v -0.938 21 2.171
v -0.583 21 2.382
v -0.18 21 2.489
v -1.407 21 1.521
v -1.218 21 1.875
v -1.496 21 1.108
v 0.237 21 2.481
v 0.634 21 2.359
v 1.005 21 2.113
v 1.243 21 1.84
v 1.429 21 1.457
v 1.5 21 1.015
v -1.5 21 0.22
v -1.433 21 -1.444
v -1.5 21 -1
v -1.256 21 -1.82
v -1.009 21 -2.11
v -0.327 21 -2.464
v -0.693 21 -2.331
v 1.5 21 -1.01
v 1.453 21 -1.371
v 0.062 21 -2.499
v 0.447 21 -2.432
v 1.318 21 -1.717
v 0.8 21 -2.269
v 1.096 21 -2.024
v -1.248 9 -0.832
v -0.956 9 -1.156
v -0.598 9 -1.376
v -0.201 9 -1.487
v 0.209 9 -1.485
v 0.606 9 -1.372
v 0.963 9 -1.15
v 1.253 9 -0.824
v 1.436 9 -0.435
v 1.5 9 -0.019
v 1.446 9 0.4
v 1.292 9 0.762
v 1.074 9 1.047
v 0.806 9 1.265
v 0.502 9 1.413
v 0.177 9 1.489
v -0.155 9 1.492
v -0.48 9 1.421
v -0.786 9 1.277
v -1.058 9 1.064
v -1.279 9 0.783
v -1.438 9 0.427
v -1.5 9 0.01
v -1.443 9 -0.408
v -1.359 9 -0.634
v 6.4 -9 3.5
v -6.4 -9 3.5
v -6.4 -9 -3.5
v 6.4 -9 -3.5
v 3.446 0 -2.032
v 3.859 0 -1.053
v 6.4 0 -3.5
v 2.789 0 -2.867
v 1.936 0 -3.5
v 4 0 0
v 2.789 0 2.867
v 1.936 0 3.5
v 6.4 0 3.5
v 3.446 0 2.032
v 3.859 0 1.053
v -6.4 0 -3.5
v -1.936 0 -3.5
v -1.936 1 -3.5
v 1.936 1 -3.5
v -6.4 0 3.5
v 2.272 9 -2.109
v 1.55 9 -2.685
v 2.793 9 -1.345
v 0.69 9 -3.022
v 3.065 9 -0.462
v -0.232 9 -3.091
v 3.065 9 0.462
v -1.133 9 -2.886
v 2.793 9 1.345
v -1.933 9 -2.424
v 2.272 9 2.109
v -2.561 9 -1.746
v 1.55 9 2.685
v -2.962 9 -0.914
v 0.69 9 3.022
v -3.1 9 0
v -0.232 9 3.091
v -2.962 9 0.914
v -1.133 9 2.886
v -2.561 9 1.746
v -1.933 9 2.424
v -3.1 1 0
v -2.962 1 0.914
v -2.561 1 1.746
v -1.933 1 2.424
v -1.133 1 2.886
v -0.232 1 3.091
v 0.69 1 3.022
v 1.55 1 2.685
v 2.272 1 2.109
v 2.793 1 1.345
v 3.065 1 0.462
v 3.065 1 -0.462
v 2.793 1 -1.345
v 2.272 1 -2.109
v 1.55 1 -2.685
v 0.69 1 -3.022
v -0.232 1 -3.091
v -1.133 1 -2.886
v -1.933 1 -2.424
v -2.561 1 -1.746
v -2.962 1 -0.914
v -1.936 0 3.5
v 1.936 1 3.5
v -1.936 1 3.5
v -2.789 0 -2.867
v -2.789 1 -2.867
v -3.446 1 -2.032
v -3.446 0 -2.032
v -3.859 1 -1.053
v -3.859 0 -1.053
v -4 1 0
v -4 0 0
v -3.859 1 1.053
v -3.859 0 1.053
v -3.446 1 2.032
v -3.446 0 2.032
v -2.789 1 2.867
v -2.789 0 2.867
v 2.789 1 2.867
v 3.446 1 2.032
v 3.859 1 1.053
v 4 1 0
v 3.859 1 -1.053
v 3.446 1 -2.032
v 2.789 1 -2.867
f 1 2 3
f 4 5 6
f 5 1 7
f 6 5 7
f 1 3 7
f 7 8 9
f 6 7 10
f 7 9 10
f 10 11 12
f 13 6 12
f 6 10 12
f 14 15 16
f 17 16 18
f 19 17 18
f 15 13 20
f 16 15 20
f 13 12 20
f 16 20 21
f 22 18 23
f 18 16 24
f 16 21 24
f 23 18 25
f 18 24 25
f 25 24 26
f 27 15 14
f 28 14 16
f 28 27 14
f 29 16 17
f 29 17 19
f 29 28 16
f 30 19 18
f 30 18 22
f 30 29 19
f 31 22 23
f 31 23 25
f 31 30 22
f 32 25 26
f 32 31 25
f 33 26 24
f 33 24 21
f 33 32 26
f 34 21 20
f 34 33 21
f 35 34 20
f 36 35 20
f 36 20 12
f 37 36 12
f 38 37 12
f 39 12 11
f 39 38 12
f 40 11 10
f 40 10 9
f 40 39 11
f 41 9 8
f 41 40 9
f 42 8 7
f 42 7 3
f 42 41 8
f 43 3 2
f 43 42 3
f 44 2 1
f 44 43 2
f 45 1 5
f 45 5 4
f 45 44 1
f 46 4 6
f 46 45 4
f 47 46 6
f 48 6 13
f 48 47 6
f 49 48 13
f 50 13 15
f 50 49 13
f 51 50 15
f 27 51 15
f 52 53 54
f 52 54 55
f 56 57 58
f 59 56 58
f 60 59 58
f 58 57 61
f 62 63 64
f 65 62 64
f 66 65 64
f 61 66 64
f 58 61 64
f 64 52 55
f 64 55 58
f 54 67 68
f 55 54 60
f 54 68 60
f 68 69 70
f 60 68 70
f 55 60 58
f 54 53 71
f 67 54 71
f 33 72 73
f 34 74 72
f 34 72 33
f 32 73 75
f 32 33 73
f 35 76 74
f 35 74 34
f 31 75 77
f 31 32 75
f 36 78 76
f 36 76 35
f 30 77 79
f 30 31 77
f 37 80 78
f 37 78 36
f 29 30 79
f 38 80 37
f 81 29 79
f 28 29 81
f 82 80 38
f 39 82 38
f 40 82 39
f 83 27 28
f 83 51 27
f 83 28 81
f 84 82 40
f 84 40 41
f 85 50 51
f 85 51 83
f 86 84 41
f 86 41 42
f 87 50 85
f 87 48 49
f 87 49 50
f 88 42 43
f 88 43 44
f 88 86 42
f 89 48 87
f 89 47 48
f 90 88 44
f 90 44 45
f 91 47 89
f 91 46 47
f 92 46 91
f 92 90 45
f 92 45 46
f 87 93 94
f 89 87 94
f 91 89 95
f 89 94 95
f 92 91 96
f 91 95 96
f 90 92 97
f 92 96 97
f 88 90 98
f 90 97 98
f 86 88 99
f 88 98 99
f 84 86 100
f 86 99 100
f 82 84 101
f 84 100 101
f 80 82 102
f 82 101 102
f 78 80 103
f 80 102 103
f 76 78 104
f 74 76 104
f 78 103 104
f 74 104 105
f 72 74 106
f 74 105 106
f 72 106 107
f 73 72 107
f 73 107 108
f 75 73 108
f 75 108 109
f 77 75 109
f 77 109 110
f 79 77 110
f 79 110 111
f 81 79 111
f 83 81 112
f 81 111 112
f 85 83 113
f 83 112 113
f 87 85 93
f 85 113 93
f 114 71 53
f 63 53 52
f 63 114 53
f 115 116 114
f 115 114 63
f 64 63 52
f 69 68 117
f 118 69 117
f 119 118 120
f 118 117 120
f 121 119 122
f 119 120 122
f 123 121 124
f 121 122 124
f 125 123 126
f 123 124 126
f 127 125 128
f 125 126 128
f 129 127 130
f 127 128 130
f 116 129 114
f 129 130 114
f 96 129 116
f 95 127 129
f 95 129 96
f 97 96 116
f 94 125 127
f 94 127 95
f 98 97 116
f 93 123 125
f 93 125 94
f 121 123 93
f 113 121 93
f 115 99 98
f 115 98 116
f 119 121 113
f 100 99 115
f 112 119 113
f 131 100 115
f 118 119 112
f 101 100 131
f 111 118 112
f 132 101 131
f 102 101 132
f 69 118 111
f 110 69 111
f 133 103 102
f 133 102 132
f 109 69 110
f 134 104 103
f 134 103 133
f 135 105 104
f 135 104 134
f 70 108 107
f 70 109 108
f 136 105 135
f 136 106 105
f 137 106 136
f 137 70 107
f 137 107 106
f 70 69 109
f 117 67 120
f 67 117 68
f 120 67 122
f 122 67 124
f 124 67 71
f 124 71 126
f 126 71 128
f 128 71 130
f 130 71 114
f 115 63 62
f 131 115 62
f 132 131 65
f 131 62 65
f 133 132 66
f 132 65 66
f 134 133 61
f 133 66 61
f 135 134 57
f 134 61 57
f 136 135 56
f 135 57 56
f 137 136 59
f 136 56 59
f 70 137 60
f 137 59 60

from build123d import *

# Parameters (mm, degrees)
ESQUISSE1_W        = 12.8
ESQUISSE1_H        = 9
BOSS_EXTRU_1_DEPTH = 3.5
BOSS_EXTRU_2_DEPTH = 1
ESQUISSE3_R        = 3.1
BOSS_EXTRU_3_DEPTH = 8


with BuildPart() as part:
    # Esquisse1 → Boss.-Extru.1 (new, symmetric)
    with BuildSketch(Plane.XY):
        with Locations((0, -4.5)):
            Rectangle(ESQUISSE1_W, ESQUISSE1_H)
    extrude(amount=BOSS_EXTRU_1_DEPTH, both=True)

    # Esquisse2 → Boss.-Extru.2 (add)
    with BuildSketch(Plane(origin=(0, 0, 0), x_dir=(1, 0, 0), z_dir=(0, 1, 0))):
        with BuildLine():
            Line((1.936491673, 3.5), (-1.936491673, 3.5))
            ThreePointArc((-1.936491673, 3.5), (-4, 0), (-1.936491673, -3.5))
            Line((-1.936491673, -3.5), (1.936491673, -3.5))
            ThreePointArc((1.936491673, -3.5), (4, 0), (1.936491673, 3.5))
        make_face()
    extrude(amount=BOSS_EXTRU_2_DEPTH)

    # Esquisse3 → Boss.-Extru.3 (add)
    with BuildSketch(Plane(origin=(0, 1, 0), x_dir=(1, 0, 0), z_dir=(0, 1, 0))):
        with Locations(Location((0, 0, 0), (0, 0, 180))):
            Circle(ESQUISSE3_R)
    extrude(amount=BOSS_EXTRU_3_DEPTH)

    # Lissage1: read off the stored shape, not the designer's step
    # Lissage1: loft between two sections, ruled curve by curve
    lissage1_from = [
        Edge.make_bspline([(-1.5, 21, -0.999999999), (-1.5, 21, -1.18566879), (-1.430190912, 21, -1.564549941), (-1.108880999, 21, -2.068285581), (-0.606403504, 21, -2.416848616), (0, 21, -2.541699349), (0.606403504, 21, -2.416848616), (1.108880999, 21, -2.068285581), (1.430190912, 21, -1.564549941), (1.5, 21, -1.18566879), (1.5, 21, -0.811971834), (1.5, 21, -0.473320268), (1.5, 21, 0), (1.5, 21, 0.473320268), (1.5, 21, 0.811971834), (1.5, 21, 1.18566879), (1.430190912, 21, 1.564549941), (1.108880999, 21, 2.068285581), (0.606403504, 21, 2.416848616), (0, 21, 2.541699349), (-0.606403504, 21, 2.416848616), (-1.108880999, 21, 2.068285581), (-1.430190912, 21, 1.564549941), (-1.5, 21, 1.18566879), (-1.5, 21, 0.811971834), (-1.5, 21, 0.473320268), (-1.5, 21, 0), (-1.5, 21, -0.473320268), (-1.5, 21, -0.811971834), (-1.5, 21, -0.999999999)], [0, 0, 0, 0, 0.041490919, 0.082981838, 0.124472757, 0.165963676, 0.207454595, 0.248945514, 0.290436432, 0.331927351, 0.331927351, 0.373945514, 0.415963676, 0.457981838, 0.5, 0.5, 0.541490919, 0.582981838, 0.624472757, 0.665963676, 0.707454595, 0.748945514, 0.790436432, 0.831927351, 0.831927351, 0.873945514, 0.915963676, 0.957981838, 1, 1, 1, 1], 3),
    ]
    lissage1_to = [
        Edge.make_bspline([(-1.248075441, 9, -0.832050294), (-1.175771622, 9, -0.940506024), (-1.006710877, 9, -1.133071374), (-0.699452785, 9, -1.34380864), (-0.358220052, 9, -1.471362722), (0, 9, -1.514343967), (0.358220052, 9, -1.471362722), (0.699452785, 9, -1.34380864), (1.006710877, 9, -1.133071374), (1.175771622, 9, -0.940506024), (1.321298058, 9, -0.72221637), (1.449339658, 9, -0.467018972), (1.525563306, 9, 0), (1.449339658, 9, 0.467018972), (1.321298058, 9, 0.72221637), (1.175771622, 9, 0.940506024), (1.006710877, 9, 1.133071374), (0.699452785, 9, 1.34380864), (0.358220052, 9, 1.471362722), (0, 9, 1.514343967), (-0.358220052, 9, 1.471362722), (-0.699452785, 9, 1.34380864), (-1.006710877, 9, 1.133071374), (-1.175771622, 9, 0.940506024), (-1.321298058, 9, 0.72221637), (-1.449339658, 9, 0.467018972), (-1.525563306, 9, 0), (-1.449339658, 9, -0.467018972), (-1.321298058, 9, -0.72221637), (-1.248075441, 9, -0.832050294)], [0, 0, 0, 0, 0.041490919, 0.082981838, 0.124472757, 0.165963676, 0.207454595, 0.248945514, 0.290436432, 0.331927351, 0.331927351, 0.373945514, 0.415963676, 0.457981838, 0.5, 0.5, 0.541490919, 0.582981838, 0.624472757, 0.665963676, 0.707454595, 0.748945514, 0.790436432, 0.831927351, 0.831927351, 0.873945514, 0.915963676, 0.957981838, 1, 1, 1, 1], 3),
    ]
    lissage1 = Solid(Shell([*[Face.make_surface_from_curves(lissage1_from[k], lissage1_to[k]) for k in range(1)], Face(Wire(lissage1_from)), Face(Wire(lissage1_to))]))
    add(lissage1)


solid = part.part
